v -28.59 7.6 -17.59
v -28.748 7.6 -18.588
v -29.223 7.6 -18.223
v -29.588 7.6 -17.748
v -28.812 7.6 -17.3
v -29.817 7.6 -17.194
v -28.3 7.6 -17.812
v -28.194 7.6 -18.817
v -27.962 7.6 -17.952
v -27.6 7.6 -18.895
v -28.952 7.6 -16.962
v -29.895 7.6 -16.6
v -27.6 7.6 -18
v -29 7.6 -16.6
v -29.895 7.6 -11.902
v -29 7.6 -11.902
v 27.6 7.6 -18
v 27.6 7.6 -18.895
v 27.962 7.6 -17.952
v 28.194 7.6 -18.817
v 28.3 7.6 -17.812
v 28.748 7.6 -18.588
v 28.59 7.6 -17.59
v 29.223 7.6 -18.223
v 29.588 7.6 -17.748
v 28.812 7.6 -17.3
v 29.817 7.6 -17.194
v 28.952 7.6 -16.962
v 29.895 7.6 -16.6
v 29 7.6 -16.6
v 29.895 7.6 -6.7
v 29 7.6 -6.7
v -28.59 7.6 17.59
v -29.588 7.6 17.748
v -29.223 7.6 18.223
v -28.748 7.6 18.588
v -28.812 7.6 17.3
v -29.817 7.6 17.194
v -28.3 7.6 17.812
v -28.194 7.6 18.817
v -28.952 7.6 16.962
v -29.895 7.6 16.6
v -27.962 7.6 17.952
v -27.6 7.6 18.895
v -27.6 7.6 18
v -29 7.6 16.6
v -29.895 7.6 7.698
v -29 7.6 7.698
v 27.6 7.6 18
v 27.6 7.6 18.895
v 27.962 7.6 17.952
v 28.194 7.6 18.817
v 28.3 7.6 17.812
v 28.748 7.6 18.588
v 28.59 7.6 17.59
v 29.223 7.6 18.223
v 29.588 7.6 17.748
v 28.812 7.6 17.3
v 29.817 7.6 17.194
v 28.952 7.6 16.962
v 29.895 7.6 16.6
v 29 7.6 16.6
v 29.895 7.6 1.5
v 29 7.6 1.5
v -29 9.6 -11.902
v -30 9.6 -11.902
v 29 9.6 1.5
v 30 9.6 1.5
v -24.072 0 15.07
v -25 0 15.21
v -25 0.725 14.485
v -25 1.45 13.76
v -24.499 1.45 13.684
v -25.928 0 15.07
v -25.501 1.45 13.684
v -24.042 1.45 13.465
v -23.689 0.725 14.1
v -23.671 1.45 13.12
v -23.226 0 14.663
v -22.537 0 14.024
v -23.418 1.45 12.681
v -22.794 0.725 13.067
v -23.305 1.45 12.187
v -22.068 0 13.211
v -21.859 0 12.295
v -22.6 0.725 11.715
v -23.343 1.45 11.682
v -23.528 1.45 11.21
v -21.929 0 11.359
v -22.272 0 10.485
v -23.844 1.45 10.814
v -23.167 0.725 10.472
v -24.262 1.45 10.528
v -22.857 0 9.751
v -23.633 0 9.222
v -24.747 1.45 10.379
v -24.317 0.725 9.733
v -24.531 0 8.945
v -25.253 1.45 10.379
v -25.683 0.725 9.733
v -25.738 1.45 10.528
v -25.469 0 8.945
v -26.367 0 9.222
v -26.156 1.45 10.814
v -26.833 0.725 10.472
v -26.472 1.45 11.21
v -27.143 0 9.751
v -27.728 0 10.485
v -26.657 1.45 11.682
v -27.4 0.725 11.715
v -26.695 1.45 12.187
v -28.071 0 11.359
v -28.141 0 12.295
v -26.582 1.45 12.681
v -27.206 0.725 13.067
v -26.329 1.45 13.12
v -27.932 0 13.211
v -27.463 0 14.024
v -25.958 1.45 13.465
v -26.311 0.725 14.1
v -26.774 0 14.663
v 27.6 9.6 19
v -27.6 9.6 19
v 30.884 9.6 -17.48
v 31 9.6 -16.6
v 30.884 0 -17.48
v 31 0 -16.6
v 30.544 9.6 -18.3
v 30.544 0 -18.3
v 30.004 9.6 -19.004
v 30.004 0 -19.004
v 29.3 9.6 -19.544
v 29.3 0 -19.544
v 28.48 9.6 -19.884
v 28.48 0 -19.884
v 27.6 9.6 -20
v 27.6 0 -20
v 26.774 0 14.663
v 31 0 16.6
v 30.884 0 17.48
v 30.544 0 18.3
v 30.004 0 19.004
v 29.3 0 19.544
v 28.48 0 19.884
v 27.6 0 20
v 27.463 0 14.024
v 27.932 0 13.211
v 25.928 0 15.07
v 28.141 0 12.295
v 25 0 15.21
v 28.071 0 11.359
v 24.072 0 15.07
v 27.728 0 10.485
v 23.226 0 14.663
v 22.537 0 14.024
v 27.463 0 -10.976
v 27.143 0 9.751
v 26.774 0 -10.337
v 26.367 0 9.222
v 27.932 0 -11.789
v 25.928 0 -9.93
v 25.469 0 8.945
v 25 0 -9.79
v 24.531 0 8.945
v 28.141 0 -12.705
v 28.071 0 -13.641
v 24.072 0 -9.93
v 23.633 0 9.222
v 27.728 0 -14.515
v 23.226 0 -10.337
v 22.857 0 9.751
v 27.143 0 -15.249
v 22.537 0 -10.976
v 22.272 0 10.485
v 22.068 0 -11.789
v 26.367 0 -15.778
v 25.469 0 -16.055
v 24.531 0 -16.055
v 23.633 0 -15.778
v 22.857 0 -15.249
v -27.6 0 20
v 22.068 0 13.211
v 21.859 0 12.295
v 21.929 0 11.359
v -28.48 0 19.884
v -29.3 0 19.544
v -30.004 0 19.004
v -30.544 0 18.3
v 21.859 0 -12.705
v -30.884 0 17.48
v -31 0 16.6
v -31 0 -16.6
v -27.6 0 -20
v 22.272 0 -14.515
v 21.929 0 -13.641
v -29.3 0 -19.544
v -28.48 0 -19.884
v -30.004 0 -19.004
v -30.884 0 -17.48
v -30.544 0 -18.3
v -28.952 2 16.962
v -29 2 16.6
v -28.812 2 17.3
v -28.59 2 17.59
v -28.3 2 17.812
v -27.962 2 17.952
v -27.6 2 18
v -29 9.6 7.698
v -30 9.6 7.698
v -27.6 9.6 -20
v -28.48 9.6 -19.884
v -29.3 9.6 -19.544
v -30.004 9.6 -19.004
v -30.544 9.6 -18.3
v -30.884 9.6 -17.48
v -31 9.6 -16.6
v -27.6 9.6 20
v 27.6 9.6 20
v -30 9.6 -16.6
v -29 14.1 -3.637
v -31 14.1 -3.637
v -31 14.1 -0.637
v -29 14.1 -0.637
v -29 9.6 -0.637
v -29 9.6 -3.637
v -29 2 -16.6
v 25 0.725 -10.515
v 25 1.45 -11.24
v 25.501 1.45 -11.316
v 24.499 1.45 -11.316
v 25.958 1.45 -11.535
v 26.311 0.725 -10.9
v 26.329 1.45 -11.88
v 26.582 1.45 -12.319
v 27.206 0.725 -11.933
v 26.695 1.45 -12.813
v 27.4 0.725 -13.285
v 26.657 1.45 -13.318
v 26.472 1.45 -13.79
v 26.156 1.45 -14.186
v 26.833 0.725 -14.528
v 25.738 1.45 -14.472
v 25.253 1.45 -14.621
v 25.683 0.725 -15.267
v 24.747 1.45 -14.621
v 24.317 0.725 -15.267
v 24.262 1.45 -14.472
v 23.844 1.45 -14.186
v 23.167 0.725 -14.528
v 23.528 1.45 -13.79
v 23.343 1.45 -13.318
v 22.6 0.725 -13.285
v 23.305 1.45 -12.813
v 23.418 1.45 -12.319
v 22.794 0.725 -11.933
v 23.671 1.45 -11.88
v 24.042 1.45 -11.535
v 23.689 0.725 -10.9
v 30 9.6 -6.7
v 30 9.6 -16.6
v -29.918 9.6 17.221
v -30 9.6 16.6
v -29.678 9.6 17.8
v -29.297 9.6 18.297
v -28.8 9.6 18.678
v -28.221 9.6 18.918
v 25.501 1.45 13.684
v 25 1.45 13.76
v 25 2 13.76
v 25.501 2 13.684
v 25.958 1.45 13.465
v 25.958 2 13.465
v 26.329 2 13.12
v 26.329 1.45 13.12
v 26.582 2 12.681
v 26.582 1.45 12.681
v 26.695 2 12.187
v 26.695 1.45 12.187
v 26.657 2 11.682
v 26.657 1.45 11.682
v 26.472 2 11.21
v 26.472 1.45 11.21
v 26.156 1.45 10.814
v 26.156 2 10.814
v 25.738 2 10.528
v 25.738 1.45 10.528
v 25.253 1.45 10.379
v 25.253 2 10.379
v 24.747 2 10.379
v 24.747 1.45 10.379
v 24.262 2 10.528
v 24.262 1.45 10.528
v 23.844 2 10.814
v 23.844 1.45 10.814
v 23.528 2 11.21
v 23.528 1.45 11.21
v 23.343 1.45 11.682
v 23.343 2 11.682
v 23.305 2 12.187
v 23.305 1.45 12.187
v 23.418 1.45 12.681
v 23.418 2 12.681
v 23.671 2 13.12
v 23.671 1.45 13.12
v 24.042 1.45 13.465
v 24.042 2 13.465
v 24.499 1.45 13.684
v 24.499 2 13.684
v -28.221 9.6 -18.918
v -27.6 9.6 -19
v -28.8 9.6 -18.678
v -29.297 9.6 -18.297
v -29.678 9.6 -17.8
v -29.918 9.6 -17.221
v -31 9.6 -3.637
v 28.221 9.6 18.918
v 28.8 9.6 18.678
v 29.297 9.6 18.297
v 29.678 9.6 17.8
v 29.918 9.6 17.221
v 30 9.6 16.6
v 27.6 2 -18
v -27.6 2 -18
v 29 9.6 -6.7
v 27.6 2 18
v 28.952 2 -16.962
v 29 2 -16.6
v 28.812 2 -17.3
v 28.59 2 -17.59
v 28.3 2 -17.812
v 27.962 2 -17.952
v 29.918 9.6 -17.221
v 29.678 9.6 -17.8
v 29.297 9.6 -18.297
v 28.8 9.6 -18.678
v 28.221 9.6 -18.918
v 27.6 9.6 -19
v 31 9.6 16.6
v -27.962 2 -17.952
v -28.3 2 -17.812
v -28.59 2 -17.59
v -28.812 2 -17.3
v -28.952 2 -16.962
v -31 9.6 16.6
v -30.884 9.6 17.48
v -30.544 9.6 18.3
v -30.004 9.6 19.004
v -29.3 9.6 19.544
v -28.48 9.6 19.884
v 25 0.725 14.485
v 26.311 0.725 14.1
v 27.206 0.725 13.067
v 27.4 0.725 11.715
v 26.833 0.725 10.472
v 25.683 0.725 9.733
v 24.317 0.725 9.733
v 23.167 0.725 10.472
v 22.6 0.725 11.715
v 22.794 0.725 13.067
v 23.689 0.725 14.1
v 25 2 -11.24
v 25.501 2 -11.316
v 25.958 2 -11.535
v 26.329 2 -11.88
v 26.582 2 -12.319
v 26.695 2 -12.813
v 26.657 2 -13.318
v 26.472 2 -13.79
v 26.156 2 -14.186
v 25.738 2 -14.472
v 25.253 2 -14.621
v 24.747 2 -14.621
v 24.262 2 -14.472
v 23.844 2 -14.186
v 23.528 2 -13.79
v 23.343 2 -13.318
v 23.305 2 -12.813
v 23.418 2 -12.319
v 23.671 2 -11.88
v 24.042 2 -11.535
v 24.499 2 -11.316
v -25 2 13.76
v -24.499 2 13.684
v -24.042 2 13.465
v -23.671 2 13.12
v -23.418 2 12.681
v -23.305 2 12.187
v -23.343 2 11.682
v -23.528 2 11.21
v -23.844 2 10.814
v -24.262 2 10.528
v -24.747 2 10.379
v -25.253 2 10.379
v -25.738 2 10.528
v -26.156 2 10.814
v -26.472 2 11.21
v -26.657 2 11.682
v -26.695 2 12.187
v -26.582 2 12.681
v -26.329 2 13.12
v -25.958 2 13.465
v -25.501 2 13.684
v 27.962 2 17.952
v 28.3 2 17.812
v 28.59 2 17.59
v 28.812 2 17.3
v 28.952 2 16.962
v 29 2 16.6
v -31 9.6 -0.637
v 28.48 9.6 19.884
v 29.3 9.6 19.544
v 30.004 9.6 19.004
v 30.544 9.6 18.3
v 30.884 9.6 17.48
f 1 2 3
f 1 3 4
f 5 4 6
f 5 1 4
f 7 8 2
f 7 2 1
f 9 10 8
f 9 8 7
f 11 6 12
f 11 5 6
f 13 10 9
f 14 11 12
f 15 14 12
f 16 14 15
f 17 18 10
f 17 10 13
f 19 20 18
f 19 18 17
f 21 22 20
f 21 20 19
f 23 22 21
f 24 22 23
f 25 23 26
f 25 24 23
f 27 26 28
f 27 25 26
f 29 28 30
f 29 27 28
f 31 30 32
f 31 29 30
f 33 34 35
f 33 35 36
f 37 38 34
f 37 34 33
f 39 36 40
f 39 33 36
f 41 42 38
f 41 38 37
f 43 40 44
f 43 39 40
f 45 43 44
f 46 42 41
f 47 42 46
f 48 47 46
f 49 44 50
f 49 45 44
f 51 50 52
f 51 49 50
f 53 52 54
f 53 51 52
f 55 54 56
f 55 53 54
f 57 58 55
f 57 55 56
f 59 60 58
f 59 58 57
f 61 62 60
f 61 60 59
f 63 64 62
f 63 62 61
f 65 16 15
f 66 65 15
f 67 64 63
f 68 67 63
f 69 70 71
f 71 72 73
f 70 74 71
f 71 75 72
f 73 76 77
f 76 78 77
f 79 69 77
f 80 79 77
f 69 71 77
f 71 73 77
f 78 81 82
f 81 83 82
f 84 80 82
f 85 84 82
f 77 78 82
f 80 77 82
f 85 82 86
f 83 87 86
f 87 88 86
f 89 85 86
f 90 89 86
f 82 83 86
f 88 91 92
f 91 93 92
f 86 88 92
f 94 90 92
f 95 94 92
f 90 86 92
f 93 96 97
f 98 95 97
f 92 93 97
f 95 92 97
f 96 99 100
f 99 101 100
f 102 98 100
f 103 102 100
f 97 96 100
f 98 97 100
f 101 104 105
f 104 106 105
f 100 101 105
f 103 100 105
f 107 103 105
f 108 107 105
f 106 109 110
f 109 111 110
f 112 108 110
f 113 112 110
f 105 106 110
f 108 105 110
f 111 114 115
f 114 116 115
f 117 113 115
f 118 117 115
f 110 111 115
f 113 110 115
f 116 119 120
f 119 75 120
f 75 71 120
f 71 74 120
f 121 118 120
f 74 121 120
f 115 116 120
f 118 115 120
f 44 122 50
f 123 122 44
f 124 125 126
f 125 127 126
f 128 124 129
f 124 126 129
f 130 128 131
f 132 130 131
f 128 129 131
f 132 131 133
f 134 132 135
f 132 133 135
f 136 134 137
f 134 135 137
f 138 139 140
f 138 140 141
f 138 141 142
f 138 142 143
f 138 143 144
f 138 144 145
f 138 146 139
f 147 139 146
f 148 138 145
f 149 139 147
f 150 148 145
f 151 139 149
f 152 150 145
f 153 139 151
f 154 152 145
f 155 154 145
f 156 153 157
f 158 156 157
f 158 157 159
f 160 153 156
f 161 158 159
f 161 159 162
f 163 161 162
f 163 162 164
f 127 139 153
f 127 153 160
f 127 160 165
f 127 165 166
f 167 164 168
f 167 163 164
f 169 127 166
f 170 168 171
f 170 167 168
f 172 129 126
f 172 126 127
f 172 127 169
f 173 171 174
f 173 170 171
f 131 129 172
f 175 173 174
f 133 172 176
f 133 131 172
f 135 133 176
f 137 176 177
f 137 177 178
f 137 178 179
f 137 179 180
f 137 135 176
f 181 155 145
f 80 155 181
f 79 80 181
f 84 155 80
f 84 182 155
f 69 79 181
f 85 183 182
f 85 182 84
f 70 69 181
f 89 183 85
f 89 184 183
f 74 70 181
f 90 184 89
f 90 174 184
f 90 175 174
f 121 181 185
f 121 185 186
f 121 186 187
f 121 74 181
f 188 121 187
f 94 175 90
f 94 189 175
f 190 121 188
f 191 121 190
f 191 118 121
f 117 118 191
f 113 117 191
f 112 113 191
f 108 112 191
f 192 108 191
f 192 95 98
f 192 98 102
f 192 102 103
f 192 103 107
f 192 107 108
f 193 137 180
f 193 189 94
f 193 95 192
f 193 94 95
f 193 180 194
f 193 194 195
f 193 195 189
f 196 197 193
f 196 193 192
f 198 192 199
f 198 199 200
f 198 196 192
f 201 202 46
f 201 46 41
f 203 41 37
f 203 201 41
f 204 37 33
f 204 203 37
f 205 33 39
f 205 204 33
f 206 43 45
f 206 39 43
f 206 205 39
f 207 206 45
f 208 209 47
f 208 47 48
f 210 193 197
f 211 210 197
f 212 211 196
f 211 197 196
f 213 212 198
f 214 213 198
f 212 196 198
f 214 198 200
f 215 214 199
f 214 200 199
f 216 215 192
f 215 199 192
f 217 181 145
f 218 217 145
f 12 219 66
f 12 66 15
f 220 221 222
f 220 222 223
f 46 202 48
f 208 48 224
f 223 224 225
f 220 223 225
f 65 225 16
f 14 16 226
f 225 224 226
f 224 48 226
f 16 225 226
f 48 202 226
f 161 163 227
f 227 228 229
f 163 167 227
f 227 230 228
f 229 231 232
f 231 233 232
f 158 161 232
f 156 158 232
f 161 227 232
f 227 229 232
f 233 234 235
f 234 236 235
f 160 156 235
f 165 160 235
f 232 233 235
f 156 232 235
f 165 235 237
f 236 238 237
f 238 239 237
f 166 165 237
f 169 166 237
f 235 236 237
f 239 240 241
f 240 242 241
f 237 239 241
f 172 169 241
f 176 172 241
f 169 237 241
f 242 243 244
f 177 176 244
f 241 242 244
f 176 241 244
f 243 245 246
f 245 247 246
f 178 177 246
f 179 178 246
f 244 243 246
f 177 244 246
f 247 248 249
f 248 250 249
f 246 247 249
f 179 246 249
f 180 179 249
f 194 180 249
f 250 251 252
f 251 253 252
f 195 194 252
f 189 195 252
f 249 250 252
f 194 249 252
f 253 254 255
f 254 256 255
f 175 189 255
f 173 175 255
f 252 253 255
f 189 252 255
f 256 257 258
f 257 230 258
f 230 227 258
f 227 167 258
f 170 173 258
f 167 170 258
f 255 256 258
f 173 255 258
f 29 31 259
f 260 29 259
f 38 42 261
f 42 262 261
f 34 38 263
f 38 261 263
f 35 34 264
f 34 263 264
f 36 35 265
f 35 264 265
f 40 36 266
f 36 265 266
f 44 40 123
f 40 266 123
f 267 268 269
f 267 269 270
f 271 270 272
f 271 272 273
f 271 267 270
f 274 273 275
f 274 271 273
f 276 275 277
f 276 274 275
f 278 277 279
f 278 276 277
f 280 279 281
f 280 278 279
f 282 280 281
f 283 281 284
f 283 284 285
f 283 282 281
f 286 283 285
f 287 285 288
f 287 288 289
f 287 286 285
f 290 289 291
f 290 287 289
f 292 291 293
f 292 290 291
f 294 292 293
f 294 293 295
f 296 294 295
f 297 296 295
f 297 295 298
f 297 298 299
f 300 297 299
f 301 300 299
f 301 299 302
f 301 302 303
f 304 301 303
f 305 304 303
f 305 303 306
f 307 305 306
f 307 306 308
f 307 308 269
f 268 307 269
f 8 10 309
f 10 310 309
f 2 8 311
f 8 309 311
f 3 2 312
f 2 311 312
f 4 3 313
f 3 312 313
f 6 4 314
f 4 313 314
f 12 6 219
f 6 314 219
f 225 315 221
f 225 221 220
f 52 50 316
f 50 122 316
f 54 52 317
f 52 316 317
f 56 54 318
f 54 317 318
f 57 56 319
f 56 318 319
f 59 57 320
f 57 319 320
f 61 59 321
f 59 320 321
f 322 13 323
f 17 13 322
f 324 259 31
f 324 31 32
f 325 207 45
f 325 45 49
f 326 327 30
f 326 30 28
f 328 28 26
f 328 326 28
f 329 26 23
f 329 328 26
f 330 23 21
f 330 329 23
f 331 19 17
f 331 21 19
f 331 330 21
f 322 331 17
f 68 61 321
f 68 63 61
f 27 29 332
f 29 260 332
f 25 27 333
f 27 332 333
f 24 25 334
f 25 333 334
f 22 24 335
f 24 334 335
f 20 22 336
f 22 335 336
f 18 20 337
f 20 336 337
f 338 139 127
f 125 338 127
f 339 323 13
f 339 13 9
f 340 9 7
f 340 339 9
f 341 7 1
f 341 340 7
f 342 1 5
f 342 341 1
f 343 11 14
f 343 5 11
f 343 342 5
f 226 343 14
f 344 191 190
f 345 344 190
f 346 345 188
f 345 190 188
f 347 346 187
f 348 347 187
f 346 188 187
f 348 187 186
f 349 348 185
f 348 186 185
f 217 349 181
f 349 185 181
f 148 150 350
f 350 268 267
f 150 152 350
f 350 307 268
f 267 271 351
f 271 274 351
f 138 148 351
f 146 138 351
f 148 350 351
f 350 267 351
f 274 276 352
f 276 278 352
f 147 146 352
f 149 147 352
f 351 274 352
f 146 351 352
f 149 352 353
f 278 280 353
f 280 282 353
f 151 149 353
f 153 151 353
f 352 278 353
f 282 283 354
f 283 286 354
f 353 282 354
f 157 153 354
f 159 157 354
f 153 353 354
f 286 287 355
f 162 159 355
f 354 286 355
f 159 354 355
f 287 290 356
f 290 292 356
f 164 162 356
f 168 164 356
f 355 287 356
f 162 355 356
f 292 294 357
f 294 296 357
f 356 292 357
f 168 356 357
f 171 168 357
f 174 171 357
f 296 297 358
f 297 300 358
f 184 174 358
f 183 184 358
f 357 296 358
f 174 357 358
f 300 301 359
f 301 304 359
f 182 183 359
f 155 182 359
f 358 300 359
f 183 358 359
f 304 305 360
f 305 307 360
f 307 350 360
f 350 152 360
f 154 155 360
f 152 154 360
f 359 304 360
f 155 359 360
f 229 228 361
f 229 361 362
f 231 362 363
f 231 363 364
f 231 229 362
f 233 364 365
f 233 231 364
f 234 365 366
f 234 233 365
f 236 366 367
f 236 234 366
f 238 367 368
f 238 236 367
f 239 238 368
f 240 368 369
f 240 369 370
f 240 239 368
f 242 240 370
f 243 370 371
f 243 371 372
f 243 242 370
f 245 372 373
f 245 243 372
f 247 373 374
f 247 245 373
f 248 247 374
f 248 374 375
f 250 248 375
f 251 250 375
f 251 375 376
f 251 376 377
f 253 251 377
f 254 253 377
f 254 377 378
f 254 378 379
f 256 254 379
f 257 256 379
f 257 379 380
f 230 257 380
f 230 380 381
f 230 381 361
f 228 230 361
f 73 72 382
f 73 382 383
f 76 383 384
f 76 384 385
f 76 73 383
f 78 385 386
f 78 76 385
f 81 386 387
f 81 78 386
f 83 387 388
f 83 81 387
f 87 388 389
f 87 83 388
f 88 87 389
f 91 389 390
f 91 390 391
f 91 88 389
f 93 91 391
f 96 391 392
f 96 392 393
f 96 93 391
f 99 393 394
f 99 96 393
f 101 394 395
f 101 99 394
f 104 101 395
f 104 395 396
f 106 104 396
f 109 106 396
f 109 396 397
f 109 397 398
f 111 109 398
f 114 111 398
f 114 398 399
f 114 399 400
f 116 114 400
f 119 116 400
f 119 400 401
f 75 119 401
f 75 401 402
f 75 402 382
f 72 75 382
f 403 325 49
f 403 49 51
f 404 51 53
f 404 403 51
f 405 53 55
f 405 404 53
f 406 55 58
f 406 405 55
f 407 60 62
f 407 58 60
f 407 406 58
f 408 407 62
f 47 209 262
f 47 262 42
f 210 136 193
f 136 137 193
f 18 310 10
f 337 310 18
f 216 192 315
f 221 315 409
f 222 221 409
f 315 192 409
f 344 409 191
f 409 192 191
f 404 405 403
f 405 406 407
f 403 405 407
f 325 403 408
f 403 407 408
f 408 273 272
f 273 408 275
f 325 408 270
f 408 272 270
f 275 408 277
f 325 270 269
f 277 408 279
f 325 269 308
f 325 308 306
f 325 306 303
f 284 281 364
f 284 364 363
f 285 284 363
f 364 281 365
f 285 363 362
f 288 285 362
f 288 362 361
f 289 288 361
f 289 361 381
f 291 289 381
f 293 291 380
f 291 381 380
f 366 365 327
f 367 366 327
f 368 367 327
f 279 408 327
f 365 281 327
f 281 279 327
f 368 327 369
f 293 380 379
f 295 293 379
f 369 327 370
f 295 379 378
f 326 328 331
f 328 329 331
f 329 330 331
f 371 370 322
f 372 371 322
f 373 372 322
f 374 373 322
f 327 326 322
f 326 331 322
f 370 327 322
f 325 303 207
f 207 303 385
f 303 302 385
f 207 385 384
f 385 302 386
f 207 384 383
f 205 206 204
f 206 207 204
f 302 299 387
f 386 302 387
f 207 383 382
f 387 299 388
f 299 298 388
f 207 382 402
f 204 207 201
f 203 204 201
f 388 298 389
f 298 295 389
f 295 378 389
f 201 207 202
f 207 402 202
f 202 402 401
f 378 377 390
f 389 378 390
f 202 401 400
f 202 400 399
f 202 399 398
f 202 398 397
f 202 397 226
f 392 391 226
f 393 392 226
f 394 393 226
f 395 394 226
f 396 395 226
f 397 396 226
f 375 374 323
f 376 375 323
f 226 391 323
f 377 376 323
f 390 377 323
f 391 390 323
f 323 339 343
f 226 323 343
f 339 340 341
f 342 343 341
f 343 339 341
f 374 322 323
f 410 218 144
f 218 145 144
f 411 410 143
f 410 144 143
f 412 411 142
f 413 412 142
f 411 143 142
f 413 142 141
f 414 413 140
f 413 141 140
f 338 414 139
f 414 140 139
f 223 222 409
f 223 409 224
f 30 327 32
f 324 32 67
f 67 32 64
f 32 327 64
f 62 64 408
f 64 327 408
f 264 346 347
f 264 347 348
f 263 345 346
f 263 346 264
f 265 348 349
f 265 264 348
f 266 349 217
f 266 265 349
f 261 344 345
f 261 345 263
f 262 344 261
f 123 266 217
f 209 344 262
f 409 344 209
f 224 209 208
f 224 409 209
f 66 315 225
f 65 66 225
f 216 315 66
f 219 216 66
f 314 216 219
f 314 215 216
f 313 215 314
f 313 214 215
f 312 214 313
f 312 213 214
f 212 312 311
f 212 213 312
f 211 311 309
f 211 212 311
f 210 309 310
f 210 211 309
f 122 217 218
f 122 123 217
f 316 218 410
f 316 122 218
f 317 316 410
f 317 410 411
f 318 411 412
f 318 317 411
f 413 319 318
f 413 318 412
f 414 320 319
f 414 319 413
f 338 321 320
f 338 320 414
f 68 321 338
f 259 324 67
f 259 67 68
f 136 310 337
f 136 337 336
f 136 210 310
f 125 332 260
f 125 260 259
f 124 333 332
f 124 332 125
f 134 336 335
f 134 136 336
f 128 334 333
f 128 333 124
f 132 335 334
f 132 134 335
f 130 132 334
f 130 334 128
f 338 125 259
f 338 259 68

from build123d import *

# Parameters (mm, degrees)
SKETCH1_R                                       = 1.7
BOSS_EXTRUDE1_DEPTH                             = 2
BOSS_EXTRUDE2_DEPTH                             = 7.6
SKETCH3_W                                       = 2
SKETCH3_H                                       = 3
BOSS_EXTRUDE3_DEPTH                             = 4.5
CSK_FOR_M3_FLAT_HEAD_MACHINE_SCREW1_D           = 3.4
CSK_FOR_M3_FLAT_HEAD_MACHINE_SCREW1_CSINK_D     = 6.3
CSK_FOR_M3_FLAT_HEAD_MACHINE_SCREW1_CSINK_ANGLE = 90
SKETCH6_W                                       = 2
SKETCH6_H                                       = 8.265
SKETCH6_H_2                                     = 8.335
SKETCH6_H_3                                     = 3.6
CUT_EXTRUDE1_DEPTH                              = 1
GROOVE2_START                                   = -18
GROOVE2_OUTLINE_W                               = 58
GROOVE2_OUTLINE_H                               = 2
GROOVE2_DEPTH                                   = 36.20069
GROOVE2_START_2                                 = 7.697541275
GROOVE2_2_DEPTH                                 = 8.902458725
GROOVE2_START_3                                 = -16.6
GROOVE2_3_DEPTH                                 = 9.9
GROOVE2_START_4                                 = 1.5
GROOVE2_4_DEPTH                                 = 6.197541275
GROOVE2_5_DEPTH                                 = 4.697541275
BOSS_EXTRUDE4_DEPTH                             = 1


with BuildPart() as part:
    # Sketch1 → Boss-Extrude1 (new body)
    with BuildSketch(Plane(origin=(0, 0, 0), x_dir=(1, 0, 0), z_dir=(0, 1, 0))):
        with BuildLine():
            Line((-27.6, 20), (27.6, 20))
            ThreePointArc((27.6, 20), (30.004163056, 19.004163056), (31, 16.6))
            Line((31, 16.6), (31, -16.6))
            ThreePointArc((31, -16.6), (30.004163056, -19.004163056), (27.6, -20))
            Line((27.6, -20), (-27.6, -20))
            ThreePointArc((-27.6, -20), (-30.004163056, -19.004163056), (-31, -16.6))
            Line((-31, -16.6), (-31, 16.6))
            ThreePointArc((-31, 16.6), (-30.004163056, 19.004163056), (-27.6, 20))
        make_face()
        with Locations(Location((-25, -12.06, 0), (0, 0, 270))):
            Circle(SKETCH1_R, mode=Mode.SUBTRACT)
        with Locations(Location((25, -12.06, 0), (0, 0, 270))):
            Circle(SKETCH1_R, mode=Mode.SUBTRACT)
        with Locations(Location((25, 12.94, 0), (0, 0, 270))):
            Circle(SKETCH1_R, mode=Mode.SUBTRACT)
    extrude(amount=BOSS_EXTRUDE1_DEPTH)

    # Sketch2 → Boss-Extrude2 (add)
    with BuildSketch(Plane(origin=(0, 2, 0), x_dir=(1, 0, 0), z_dir=(0, 1, 0))):
        with BuildLine():
            Line((-27.6, -20), (27.6, -20))
            ThreePointArc((27.6, -20), (30.004163056, -19.004163056), (31, -16.6))
            Line((31, -16.6), (31, 16.6))
            ThreePointArc((31, 16.6), (30.004163056, 19.004163056), (27.6, 20))
            Line((27.6, 20), (-27.6, 20))
            ThreePointArc((-27.6, 20), (-30.004163056, 19.004163056), (-31, 16.6))
            Line((-31, 16.6), (-31, -16.6))
            ThreePointArc((-31, -16.6), (-30.004163056, -19.004163056), (-27.6, -20))
        make_face()
        with BuildLine():
            Line((27.6, 18), (-27.6, 18))
            ThreePointArc((-27.6, 18), (-28.589949494, 17.589949494), (-29, 16.6))
            Line((-29, 16.6), (-29, -16.6))
            ThreePointArc((-29, -16.6), (-28.589949494, -17.589949494), (-27.6, -18))
            Line((-27.6, -18), (27.6, -18))
            ThreePointArc((27.6, -18), (28.589949494, -17.589949494), (29, -16.6))
            Line((29, -16.6), (29, 16.6))
            ThreePointArc((29, 16.6), (28.589949494, 17.589949494), (27.6, 18))
        make_face(mode=Mode.SUBTRACT)
    extrude(amount=BOSS_EXTRUDE2_DEPTH)

    # Sketch3 → Boss-Extrude3 (add)
    with BuildSketch(Plane(origin=(0, 9.6, 0), x_dir=(1, 0, 0), z_dir=(0, 1, 0))):
        with Locations((-30, 2.137458725)):
            Rectangle(SKETCH3_W, SKETCH3_H)
    extrude(amount=BOSS_EXTRUDE3_DEPTH)

    # CSK for M3 Flat Head Machine Screw1 (through all)
    with Locations(Plane(origin=(-25, 0, 12.06), x_dir=(0, 0, -1), z_dir=(0, -1, 0))):
        with Locations((0, 0), (0, 50), (25, 50)):
            CounterSinkHole(CSK_FOR_M3_FLAT_HEAD_MACHINE_SCREW1_D / 2, CSK_FOR_M3_FLAT_HEAD_MACHINE_SCREW1_CSINK_D / 2, counter_sink_angle=CSK_FOR_M3_FLAT_HEAD_MACHINE_SCREW1_CSINK_ANGLE)

    # Sketch6 → Cut-Extrude1 (cut)
    with BuildSketch(Plane(origin=(0, 9.6, 0), x_dir=(1, 0, 0), z_dir=(0, 1, 0))):
        with Locations((-30, 7.769958725)):
            Rectangle(SKETCH6_W, SKETCH6_H)
        with Locations((-30, -3.530041275)):
            Rectangle(SKETCH6_W, SKETCH6_H_2)
        with Locations((30, 4.9)):
            Rectangle(SKETCH6_W, SKETCH6_H_3)
        with Locations((30, 0.3)):
            Rectangle(SKETCH6_W, SKETCH6_H_3)
    extrude(amount=-CUT_EXTRUDE1_DEPTH, mode=Mode.SUBTRACT)

    # Groove2: read off the stored shape, not the designer's step
    # Groove2 outline → Groove2 (cut)
    with BuildSketch(Plane.XY.offset(GROOVE2_START)):
        with Locations((0, 8.6)):
            Rectangle(GROOVE2_OUTLINE_W, GROOVE2_OUTLINE_H)
    extrude(amount=GROOVE2_DEPTH, mode=Mode.SUBTRACT)

    # Groove2 2 outline → Groove2 2 (cut)
    with BuildSketch(Plane.XY.offset(GROOVE2_START_2)):
        Polygon((29, 7.6), (29.895184441, 7.6), (30, 9.6), (29, 9.6), align=None)
        Polygon((-29.895184441, 7.6), (-29, 7.6), (-29, 9.6), (-30, 9.6), align=None)
    extrude(amount=GROOVE2_2_DEPTH, mode=Mode.SUBTRACT)

    # Groove2 3 outline → Groove2 3 (cut)
    with BuildSketch(Plane.XY.offset(GROOVE2_START_3)):
        Polygon((29, 7.6), (29.895184441, 7.6), (30, 9.6), (29, 9.6), align=None)
    extrude(amount=GROOVE2_3_DEPTH, mode=Mode.SUBTRACT)

    # Groove2 4 outline → Groove2 4 (cut)
    with BuildSketch(Plane.XY.offset(GROOVE2_START_4)):
        Polygon((29, 7.6), (29.895184441, 7.6), (30, 9.6), (29, 9.6), align=None)
    extrude(amount=GROOVE2_4_DEPTH, mode=Mode.SUBTRACT)

    # Groove2 5 outline → Groove2 5 (cut)
    with BuildSketch(Plane.XY.offset(GROOVE2_START_3)):
        Polygon((-29.895184441, 7.6), (-29, 7.6), (-29, 9.6), (-30, 9.6), align=None)
    extrude(amount=GROOVE2_5_DEPTH, mode=Mode.SUBTRACT)

    # Groove2 6: loft between two sections, ruled curve by curve
    groove2_6_from = [
        Edge.make_three_point_arc((-29.895184441, 7.6, 16.6), (-29.222940483, 7.6, 18.222940483), (-27.6, 7.6, 18.895184441)),
        Edge.make_three_point_arc((27.6, 7.6, 18.895184441), (29.222940483, 7.6, 18.222940483), (29.895184441, 7.6, 16.6)),
        Edge.make_line((27.6, 7.6, 18.895184441), (-27.6, 7.6, 18.895184441)),
        Edge.make_line((29.895184441, 7.6, 16.6), (-29.895184441, 7.6, 16.6)),
    ]
    groove2_6_to = [
        Edge.make_three_point_arc((-30, 9.6, 16.6), (-29.297056275, 9.6, 18.297056275), (-27.6, 9.6, 19)),
        Edge.make_three_point_arc((27.6, 9.6, 19), (29.297056275, 9.6, 18.297056275), (30, 9.6, 16.6)),
        Edge.make_line((27.6, 9.6, 19), (-27.6, 9.6, 19)),
        Edge.make_line((30, 9.6, 16.6), (-30, 9.6, 16.6)),
    ]
    groove2_6 = Solid(Shell([*[Face.make_surface_from_curves(groove2_6_from[k], groove2_6_to[k]) for k in range(4)], Face(Wire(groove2_6_from)), Face(Wire(groove2_6_to))]))
    add(groove2_6, mode=Mode.SUBTRACT)

    # Groove2 7: loft between two sections, ruled curve by curve
    groove2_7_from = [
        Edge.make_three_point_arc((29.895184441, 7.6, -16.6), (29.222940483, 7.6, -18.222940483), (27.6, 7.6, -18.895184441)),
        Edge.make_three_point_arc((-27.6, 7.6, -18.895184441), (-29.222940483, 7.6, -18.222940483), (-29.895184441, 7.6, -16.6)),
        Edge.make_line((-27.6, 7.6, -18.895184441), (27.6, 7.6, -18.895184441)),
        Edge.make_line((-29.895184441, 7.6, -16.6), (29.895184441, 7.6, -16.6)),
    ]
    groove2_7_to = [
        Edge.make_three_point_arc((30, 9.6, -16.6), (29.297056275, 9.6, -18.297056275), (27.6, 9.6, -19)),
        Edge.make_three_point_arc((-27.6, 9.6, -19), (-29.297056275, 9.6, -18.297056275), (-30, 9.6, -16.6)),
        Edge.make_line((-27.6, 9.6, -19), (27.6, 9.6, -19)),
        Edge.make_line((-30, 9.6, -16.6), (30, 9.6, -16.6)),
    ]
    groove2_7 = Solid(Shell([*[Face.make_surface_from_curves(groove2_7_from[k], groove2_7_to[k]) for k in range(4)], Face(Wire(groove2_7_from)), Face(Wire(groove2_7_to))]))
    add(groove2_7, mode=Mode.SUBTRACT)

    # Sketch7 → Boss-Extrude4 (add)
    with BuildSketch(Plane(origin=(0, 8.6, 0), x_dir=(1, 0, 0), z_dir=(0, 1, 0))):
        Polygon((-31, 11.902458725), (-31, 3.637458725), (-29, 3.637458725), (-29, 11.902458725), (-29.947592221, 11.902458725), align=None)
        Polygon((-29, -7.697541275), (-29, 0.637458725), (-31, 0.637458725), (-31, -7.697541275), (-29.947592221, -7.697541275), align=None)
        Polygon((29, 3.1), (31, 3.1), (31, 6.7), (29.947592221, 6.7), (29, 6.7), align=None)
        Polygon((31, 2.1), (29, 2.1), (29, -1.5), (29.947592221, -1.5), (31, -1.5), align=None)
    extrude(amount=BOSS_EXTRUDE4_DEPTH)


solid = part.part
